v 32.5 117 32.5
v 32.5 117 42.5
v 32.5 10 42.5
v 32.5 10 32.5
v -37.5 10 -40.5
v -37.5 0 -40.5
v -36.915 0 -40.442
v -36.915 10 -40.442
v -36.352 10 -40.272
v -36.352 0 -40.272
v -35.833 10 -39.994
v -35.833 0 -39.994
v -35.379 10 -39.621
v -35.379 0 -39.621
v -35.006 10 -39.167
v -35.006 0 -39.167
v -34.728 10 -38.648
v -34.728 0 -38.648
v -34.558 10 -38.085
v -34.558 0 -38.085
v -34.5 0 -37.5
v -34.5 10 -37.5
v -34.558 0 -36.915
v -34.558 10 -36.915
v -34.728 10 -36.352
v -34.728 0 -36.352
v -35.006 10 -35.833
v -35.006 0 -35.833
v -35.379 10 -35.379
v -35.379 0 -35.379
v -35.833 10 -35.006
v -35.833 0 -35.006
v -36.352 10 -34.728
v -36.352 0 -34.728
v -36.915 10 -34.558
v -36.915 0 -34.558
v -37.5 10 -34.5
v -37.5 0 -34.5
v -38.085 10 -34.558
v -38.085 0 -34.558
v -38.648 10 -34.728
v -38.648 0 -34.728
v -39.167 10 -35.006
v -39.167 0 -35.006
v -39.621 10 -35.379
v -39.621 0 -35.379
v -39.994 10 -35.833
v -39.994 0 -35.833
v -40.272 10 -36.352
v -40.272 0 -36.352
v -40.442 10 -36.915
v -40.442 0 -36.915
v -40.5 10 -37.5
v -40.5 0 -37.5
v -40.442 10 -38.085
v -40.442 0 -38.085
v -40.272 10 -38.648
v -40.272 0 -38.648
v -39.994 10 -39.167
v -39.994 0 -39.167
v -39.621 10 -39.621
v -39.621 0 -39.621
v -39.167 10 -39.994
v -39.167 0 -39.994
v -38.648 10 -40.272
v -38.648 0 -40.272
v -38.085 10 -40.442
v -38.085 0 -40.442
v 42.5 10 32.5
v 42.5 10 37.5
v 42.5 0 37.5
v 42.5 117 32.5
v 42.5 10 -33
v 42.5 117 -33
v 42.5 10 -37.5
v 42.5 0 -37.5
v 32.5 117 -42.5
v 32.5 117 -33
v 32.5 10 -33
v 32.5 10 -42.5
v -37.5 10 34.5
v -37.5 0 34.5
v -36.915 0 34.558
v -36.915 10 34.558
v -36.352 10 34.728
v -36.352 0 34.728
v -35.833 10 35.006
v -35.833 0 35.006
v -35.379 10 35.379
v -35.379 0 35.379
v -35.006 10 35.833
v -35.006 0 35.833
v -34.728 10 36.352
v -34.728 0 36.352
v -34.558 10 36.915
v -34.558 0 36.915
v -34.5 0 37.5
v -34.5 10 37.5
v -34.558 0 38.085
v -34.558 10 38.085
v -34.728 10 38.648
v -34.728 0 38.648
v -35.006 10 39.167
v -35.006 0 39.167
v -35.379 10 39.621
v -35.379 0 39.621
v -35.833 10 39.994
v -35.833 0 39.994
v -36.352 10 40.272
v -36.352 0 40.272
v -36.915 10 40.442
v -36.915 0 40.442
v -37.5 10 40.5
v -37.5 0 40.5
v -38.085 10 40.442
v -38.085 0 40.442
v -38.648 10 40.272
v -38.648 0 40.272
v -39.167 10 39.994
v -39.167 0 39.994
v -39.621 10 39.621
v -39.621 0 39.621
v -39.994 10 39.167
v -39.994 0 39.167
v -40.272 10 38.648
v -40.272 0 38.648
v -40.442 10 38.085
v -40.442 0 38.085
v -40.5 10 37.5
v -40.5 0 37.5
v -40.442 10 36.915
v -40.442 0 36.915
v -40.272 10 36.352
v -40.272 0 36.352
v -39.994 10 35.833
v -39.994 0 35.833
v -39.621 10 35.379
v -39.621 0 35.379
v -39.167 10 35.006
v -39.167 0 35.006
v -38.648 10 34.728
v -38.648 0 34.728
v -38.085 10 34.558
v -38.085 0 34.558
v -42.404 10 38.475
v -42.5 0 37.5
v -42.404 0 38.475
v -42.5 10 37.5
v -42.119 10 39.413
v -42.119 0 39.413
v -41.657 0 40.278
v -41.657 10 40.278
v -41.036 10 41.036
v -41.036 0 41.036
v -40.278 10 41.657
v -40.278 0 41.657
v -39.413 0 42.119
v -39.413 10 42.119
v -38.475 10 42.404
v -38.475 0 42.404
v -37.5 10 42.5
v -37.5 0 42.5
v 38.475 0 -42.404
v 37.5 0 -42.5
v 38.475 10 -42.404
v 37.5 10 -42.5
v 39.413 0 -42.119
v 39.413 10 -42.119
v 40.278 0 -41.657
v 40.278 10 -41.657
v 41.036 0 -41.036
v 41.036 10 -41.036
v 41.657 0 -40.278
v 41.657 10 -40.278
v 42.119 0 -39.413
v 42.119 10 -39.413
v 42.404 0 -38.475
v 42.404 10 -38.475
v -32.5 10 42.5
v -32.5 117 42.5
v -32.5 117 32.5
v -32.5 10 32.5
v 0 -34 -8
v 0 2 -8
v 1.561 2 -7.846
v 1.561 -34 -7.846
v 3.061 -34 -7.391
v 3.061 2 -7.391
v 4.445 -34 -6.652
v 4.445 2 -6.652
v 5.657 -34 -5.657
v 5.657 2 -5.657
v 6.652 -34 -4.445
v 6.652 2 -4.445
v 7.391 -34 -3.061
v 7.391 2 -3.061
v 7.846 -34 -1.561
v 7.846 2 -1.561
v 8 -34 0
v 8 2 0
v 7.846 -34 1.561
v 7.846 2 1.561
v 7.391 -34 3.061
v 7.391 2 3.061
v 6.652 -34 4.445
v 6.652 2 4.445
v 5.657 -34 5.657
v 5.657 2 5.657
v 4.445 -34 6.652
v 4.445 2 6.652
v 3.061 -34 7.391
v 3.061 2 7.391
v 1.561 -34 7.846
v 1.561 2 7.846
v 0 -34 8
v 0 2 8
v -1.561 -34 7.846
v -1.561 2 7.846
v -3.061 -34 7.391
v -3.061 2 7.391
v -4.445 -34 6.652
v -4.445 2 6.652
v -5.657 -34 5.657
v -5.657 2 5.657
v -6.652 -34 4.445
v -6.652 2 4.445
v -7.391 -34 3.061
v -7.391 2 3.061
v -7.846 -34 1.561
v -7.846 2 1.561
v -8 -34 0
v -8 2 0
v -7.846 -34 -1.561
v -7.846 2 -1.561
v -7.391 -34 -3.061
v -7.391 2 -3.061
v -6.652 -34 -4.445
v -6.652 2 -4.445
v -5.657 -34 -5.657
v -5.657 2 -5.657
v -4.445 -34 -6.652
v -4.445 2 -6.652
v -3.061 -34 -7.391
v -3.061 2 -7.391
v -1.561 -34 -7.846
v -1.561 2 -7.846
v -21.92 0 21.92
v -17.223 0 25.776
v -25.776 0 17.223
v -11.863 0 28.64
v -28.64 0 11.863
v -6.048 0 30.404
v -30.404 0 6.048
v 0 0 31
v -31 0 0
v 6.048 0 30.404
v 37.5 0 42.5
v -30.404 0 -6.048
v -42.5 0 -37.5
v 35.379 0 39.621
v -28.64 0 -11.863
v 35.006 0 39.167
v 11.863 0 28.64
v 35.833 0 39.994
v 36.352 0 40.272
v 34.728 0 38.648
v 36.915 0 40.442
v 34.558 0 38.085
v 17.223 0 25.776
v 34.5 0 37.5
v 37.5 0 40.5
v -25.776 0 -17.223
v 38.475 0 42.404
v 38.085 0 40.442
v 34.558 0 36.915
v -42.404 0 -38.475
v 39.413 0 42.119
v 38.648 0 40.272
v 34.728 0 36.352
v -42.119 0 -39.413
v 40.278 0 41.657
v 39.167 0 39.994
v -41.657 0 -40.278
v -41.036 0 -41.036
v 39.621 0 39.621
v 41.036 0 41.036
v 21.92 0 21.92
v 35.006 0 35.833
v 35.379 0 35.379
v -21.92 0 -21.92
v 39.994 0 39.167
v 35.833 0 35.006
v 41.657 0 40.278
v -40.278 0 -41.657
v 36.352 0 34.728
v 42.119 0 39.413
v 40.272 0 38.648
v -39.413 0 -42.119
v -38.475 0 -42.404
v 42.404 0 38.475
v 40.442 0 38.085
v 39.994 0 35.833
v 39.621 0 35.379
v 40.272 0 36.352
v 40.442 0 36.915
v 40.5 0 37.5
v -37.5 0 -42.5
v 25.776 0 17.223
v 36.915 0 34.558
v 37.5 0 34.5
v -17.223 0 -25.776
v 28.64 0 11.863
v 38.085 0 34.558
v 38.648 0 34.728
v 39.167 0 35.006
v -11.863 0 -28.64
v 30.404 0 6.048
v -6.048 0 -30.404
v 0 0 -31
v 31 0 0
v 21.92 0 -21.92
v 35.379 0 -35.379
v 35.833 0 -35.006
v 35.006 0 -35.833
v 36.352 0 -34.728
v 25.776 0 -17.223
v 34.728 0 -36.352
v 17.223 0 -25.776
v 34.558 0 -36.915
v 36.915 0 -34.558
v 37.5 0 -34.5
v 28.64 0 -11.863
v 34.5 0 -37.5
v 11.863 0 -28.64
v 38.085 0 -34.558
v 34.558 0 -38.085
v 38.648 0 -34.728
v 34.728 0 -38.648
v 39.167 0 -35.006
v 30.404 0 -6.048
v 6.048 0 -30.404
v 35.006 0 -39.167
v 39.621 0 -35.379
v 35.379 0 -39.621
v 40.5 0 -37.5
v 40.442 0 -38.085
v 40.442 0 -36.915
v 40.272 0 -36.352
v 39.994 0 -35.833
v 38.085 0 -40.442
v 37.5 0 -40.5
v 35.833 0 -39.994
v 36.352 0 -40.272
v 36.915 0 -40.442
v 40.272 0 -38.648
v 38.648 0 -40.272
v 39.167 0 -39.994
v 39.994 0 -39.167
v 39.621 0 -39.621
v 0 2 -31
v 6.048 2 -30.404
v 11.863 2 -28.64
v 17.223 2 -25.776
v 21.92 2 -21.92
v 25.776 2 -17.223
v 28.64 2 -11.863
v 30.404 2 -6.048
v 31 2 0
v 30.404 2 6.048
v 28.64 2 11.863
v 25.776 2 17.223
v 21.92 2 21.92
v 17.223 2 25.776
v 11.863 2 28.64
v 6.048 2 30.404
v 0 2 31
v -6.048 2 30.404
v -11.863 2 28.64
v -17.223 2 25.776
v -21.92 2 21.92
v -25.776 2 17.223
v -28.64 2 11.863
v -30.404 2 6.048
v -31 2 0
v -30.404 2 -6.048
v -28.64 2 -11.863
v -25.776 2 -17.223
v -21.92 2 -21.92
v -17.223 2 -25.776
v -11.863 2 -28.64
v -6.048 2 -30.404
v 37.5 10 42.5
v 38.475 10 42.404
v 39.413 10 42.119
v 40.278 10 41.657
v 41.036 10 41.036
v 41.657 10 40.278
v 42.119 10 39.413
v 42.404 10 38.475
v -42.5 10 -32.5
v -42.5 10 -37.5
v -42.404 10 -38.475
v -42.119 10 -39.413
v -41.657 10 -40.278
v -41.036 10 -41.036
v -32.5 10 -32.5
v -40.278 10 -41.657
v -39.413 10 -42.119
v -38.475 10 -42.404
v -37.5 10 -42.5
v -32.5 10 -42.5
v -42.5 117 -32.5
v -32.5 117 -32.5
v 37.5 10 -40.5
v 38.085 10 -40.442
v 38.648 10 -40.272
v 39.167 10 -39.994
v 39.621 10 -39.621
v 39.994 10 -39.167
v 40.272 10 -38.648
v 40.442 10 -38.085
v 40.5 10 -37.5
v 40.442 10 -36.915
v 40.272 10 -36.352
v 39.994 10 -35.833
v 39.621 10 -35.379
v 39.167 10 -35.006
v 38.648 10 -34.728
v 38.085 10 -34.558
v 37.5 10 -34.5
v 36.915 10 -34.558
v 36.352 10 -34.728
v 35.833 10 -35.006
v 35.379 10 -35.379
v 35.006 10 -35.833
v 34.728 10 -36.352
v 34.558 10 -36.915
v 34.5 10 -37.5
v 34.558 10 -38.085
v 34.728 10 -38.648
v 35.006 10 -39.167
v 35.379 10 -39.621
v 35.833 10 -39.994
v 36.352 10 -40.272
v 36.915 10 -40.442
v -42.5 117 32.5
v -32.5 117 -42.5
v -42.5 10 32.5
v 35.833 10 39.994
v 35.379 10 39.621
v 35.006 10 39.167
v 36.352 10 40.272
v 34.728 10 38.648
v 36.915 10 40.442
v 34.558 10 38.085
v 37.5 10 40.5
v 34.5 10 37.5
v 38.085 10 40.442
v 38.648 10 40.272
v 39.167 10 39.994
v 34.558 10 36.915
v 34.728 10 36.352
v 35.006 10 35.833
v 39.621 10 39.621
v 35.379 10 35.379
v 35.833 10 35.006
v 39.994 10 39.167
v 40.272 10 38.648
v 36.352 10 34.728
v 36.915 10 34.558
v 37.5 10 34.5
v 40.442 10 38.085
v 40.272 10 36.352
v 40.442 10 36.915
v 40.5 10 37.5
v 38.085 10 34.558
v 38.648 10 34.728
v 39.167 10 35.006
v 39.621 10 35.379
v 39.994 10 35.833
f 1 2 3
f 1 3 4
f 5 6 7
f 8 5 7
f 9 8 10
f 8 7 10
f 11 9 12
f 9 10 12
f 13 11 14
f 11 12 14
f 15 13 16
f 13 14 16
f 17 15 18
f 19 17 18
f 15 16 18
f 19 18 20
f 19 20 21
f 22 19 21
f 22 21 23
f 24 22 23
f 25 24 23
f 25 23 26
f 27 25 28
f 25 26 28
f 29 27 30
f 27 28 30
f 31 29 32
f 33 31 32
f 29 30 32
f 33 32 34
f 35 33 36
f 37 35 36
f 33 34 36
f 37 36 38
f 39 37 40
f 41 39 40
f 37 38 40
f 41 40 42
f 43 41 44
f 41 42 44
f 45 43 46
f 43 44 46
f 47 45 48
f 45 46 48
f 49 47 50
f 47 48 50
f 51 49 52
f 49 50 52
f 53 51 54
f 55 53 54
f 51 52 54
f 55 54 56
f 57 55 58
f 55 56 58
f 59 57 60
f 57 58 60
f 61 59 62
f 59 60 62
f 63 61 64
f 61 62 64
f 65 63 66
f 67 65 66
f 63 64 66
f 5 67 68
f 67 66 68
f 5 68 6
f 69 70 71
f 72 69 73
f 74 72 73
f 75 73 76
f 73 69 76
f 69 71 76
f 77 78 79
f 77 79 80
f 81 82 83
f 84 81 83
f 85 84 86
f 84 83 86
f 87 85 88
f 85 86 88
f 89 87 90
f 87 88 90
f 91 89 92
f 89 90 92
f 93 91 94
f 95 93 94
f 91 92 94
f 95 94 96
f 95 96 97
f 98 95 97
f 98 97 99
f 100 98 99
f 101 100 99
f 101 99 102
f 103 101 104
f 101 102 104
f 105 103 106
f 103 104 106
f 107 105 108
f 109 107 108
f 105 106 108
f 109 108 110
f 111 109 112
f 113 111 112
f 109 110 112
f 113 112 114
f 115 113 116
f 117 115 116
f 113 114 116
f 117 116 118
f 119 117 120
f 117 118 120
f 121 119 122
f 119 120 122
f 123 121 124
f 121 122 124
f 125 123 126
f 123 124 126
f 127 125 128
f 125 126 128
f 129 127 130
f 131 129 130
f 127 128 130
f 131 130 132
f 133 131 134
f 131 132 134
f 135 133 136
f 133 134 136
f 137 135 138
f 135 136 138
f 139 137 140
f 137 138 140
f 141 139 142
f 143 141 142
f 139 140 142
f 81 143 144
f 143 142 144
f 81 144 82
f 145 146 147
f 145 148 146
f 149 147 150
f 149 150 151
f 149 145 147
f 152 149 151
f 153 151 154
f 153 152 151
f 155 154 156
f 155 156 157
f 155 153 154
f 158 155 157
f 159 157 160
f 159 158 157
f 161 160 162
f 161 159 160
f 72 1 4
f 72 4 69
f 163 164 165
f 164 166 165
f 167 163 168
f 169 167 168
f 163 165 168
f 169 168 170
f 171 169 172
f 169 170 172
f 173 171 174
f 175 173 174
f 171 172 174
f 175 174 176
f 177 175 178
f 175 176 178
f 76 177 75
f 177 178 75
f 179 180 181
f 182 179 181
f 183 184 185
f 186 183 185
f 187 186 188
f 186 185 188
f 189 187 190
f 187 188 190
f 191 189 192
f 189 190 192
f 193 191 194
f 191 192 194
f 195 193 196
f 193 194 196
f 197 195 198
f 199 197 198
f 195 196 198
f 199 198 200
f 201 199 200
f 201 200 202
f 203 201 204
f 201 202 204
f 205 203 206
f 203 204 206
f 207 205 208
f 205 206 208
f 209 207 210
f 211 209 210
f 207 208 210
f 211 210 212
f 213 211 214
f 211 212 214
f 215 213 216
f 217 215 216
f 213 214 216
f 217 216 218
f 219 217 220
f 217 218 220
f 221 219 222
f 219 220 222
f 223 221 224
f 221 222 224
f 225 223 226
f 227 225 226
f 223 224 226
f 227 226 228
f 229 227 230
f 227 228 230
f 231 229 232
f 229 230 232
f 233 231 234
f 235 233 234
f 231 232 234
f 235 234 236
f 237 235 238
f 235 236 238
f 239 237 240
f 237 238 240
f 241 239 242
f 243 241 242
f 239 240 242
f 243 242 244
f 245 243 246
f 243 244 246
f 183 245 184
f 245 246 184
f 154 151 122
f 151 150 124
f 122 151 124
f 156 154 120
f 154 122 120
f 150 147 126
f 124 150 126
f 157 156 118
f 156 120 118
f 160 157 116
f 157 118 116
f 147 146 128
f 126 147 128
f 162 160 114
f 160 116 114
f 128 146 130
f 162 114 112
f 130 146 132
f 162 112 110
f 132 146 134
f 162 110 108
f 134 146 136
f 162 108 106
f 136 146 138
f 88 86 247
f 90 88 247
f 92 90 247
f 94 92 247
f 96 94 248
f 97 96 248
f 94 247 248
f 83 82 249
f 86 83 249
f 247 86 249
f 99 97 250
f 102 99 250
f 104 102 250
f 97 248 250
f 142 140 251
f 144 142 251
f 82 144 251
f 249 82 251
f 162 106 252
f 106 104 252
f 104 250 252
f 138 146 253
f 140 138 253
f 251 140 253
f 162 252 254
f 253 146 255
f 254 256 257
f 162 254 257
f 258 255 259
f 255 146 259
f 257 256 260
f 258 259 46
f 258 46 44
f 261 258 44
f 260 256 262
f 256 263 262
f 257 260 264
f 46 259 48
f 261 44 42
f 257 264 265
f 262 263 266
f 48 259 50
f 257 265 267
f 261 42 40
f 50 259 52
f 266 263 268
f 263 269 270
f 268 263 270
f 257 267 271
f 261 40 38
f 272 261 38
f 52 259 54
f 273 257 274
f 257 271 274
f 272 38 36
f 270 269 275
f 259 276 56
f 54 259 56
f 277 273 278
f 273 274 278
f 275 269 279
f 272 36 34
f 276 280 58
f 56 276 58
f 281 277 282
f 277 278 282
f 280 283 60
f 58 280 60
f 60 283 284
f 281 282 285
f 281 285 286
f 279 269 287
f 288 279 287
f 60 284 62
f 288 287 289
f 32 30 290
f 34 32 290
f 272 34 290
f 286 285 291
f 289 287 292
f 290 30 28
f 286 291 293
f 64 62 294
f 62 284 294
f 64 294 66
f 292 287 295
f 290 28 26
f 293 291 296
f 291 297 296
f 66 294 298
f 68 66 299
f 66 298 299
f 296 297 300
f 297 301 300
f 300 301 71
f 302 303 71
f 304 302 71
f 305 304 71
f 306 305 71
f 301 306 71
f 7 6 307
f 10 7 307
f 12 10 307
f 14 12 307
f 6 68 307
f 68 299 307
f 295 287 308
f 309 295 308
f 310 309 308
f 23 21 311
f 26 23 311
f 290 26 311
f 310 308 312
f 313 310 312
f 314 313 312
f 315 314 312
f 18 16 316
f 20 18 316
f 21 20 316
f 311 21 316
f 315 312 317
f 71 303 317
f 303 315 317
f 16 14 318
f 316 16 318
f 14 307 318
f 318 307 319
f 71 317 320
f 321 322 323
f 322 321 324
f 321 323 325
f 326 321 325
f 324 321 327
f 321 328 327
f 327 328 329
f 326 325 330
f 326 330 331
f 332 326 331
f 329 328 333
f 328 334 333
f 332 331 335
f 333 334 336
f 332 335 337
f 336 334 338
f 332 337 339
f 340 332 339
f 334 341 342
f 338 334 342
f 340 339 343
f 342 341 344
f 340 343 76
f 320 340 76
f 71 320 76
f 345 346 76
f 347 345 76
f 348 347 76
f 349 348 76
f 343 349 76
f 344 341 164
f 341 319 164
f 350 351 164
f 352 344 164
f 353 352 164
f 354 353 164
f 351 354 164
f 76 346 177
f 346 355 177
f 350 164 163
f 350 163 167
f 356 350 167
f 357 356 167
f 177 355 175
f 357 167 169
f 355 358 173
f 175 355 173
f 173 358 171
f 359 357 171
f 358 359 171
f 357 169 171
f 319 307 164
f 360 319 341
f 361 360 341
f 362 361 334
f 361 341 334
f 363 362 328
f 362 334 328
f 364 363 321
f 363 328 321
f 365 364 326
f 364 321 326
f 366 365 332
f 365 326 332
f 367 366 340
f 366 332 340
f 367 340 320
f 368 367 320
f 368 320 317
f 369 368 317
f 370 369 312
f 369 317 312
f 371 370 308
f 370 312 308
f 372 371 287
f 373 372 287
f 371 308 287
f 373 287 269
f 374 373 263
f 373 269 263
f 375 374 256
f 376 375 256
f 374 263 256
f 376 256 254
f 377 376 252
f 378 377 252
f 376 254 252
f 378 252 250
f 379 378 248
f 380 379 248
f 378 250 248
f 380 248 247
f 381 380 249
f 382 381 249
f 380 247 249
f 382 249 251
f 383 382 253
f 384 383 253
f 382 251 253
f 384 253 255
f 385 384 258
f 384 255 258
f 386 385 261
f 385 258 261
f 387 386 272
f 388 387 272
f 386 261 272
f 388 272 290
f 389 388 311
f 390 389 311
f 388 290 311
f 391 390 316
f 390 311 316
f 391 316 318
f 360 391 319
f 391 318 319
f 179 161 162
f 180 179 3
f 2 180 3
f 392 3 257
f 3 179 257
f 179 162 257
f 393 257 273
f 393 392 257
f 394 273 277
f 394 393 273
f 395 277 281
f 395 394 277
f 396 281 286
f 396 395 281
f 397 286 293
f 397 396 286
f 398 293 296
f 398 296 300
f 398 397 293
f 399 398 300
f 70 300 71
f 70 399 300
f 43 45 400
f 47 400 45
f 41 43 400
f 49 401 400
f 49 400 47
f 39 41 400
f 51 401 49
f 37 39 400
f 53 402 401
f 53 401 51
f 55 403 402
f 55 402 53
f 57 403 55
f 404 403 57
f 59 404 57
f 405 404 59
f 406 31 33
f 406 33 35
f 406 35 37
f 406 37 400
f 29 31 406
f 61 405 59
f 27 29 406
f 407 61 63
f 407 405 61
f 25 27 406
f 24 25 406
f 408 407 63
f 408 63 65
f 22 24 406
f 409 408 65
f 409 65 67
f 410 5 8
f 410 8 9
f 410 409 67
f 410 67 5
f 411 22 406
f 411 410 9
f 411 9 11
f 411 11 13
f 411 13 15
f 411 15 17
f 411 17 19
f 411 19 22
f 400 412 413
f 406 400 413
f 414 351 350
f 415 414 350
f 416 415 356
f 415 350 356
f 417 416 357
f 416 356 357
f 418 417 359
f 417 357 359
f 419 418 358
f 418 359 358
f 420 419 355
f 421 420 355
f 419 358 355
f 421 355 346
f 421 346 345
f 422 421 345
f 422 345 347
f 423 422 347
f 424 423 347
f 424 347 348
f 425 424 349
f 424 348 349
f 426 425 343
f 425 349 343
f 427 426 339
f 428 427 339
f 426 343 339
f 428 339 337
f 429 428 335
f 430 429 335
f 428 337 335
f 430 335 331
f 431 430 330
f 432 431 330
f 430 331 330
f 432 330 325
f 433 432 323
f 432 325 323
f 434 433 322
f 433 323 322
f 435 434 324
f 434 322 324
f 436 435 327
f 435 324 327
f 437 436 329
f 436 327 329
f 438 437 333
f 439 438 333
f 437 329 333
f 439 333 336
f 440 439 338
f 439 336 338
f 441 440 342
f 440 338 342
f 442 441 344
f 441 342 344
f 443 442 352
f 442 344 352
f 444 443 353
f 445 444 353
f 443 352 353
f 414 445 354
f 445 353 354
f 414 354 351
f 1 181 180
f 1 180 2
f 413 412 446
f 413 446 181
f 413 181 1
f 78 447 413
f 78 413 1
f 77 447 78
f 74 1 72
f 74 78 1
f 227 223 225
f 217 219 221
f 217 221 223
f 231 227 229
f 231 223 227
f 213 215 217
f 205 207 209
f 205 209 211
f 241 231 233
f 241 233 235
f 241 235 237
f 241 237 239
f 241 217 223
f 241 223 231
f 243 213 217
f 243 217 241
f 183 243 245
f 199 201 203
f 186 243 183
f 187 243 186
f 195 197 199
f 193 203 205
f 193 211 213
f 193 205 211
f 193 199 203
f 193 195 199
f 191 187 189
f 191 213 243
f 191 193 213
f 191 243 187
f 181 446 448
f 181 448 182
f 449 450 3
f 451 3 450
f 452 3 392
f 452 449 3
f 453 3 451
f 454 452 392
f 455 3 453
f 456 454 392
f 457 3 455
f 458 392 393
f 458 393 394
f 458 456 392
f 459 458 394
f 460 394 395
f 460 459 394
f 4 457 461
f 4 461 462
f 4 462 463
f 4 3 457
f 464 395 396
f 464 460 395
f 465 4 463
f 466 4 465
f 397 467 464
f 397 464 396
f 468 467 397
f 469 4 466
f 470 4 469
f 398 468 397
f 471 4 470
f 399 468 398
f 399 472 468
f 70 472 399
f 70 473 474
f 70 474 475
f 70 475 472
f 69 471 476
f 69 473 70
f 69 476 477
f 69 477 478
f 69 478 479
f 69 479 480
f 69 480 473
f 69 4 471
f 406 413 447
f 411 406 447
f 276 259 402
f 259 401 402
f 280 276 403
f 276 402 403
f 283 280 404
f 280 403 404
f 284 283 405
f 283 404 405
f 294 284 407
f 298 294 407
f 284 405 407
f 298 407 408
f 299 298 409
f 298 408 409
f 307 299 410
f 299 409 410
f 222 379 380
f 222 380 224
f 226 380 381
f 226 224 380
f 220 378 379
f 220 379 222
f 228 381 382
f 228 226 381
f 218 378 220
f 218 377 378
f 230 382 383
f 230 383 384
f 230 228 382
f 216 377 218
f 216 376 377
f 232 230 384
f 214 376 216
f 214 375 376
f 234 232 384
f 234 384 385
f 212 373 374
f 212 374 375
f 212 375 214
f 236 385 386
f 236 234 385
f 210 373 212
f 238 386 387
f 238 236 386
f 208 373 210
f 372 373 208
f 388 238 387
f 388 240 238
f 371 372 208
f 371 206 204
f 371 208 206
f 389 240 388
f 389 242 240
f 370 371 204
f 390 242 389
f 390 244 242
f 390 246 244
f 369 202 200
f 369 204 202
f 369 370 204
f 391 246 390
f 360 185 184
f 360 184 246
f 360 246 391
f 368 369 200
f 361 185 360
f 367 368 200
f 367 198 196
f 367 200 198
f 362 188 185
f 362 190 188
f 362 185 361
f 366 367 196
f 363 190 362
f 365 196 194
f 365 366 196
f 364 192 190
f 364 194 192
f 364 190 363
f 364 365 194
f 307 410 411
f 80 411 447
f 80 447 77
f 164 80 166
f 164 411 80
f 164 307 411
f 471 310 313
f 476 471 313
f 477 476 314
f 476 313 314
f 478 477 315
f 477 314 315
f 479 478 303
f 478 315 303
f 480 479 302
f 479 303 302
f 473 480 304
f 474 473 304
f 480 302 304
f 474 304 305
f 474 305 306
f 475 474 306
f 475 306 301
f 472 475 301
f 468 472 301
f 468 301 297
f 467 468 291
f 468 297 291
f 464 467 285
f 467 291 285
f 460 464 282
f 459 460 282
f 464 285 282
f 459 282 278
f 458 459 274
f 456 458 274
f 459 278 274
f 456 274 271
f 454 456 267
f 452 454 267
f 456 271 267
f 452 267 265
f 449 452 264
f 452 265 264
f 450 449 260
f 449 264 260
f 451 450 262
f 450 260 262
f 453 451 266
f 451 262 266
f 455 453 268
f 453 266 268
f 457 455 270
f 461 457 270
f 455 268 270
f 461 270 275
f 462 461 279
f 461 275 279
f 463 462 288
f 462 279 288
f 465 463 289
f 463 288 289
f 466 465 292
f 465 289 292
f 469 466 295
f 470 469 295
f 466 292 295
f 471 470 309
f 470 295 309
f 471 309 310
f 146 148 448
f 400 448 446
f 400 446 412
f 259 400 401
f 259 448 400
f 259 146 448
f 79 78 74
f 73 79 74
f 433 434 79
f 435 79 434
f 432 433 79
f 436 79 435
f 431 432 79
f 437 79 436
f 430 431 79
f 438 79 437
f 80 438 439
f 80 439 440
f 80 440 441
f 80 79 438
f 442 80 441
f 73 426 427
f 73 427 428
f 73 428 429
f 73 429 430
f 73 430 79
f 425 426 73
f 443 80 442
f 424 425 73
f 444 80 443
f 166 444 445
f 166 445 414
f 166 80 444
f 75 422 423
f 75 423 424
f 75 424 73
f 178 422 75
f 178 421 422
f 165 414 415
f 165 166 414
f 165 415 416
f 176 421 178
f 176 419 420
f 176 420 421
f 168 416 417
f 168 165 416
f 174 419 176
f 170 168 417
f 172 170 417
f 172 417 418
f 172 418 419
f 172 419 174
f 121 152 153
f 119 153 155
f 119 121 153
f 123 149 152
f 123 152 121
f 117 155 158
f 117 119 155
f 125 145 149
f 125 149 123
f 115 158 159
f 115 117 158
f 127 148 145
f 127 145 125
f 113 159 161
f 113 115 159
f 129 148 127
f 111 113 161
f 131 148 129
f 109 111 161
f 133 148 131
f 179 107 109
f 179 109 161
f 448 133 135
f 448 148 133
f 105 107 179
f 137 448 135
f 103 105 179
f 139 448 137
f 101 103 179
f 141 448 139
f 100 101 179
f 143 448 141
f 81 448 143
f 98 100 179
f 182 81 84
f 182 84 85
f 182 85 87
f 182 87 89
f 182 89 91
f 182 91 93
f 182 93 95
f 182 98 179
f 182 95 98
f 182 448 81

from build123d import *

# Parameters (mm, degrees)
CROQUIS1_W              = 85
CROQUIS1_H              = 85
SALIENTE_EXTRUIR1_DEPTH = 117
CORTAR_EXTRUIR1_START   = 10
CROQUIS2_W              = 10
CROQUIS2_H              = 10
CROQUIS2_H_2            = 9.5
CORTAR_EXTRUIR1_DEPTH   = 117
CROQUIS3_R              = 31
CORTAR_EXTRUIR2_DEPTH   = 2
CROQUIS4_R              = 8
SALIENTE_EXTRUIR2_DEPTH = 36
CROQUIS7_R              = 3
CORTAR_EXTRUIR3_DEPTH   = 10
REDONDEO7_R             = 5


with BuildPart() as part:
    # Croquis1 → Saliente-Extruir1 (new body)
    with BuildSketch(Plane(origin=(0, 0, 0), x_dir=(1, 0, 0), z_dir=(0, 1, 0))):
        Rectangle(CROQUIS1_W, CROQUIS1_H)
    extrude(amount=SALIENTE_EXTRUIR1_DEPTH)

    # Croquis2 → Cortar-Extruir1 (cut)
    with BuildSketch(Plane(origin=(0, 117, 0), x_dir=(1, 0, 0), z_dir=(0, 1, 0)).offset(CORTAR_EXTRUIR1_START)):
        with Locations((-37.5, 37.5)):
            Rectangle(CROQUIS2_W, CROQUIS2_H)
        with Locations((37.5, 37.75)):
            Rectangle(CROQUIS2_W, CROQUIS2_H_2)
        with Locations((-37.5, -37.5)):
            Rectangle(CROQUIS2_W, CROQUIS2_H)
        with Locations((37.5, -37.5)):
            Rectangle(CROQUIS2_W, CROQUIS2_H)
    extrude(amount=-CORTAR_EXTRUIR1_DEPTH, mode=Mode.SUBTRACT)

    # Croquis3 → Cortar-Extruir2 (cut)
    with BuildSketch(Plane.XZ):
        with Locations(Location((0, 0, 0), (0, 0, 270))):
            Circle(CROQUIS3_R)
    extrude(amount=-CORTAR_EXTRUIR2_DEPTH, mode=Mode.SUBTRACT)

    # Croquis4 → Saliente-Extruir2 (add)
    with BuildSketch(Plane.XZ.offset(-2)):
        with Locations(Location((0, 0, 0), (0, 0, 270))):
            Circle(CROQUIS4_R)
    extrude(amount=SALIENTE_EXTRUIR2_DEPTH)

    # Croquis7 → Cortar-Extruir3 (cut)
    with BuildSketch(Plane.XZ):
        with Locations(Location((37.5, -37.5, 0), (0, 0, 270))):
            Circle(CROQUIS7_R)
        with Locations(Location((-37.5, -37.5, 0), (0, 0, 270))):
            Circle(CROQUIS7_R)
        with Locations(Location((-37.5, 37.5, 0), (0, 0, 270))):
            Circle(CROQUIS7_R)
        with Locations(Location((37.5, 37.5, 0), (0, 0, 270))):
            Circle(CROQUIS7_R)
    extrude(amount=-CORTAR_EXTRUIR3_DEPTH, mode=Mode.SUBTRACT)

    # Redondeo7
    redondeo7_edges = [part.edges().sort_by_distance(p)[0] for p in [
        (42.5, 5, 42.5),
        (-42.5, 5, 42.5),
        (-42.5, 5, -42.5),
        (42.5, 5, -42.5),
    ]]
    fillet(redondeo7_edges, radius=REDONDEO7_R)


solid = part.part
